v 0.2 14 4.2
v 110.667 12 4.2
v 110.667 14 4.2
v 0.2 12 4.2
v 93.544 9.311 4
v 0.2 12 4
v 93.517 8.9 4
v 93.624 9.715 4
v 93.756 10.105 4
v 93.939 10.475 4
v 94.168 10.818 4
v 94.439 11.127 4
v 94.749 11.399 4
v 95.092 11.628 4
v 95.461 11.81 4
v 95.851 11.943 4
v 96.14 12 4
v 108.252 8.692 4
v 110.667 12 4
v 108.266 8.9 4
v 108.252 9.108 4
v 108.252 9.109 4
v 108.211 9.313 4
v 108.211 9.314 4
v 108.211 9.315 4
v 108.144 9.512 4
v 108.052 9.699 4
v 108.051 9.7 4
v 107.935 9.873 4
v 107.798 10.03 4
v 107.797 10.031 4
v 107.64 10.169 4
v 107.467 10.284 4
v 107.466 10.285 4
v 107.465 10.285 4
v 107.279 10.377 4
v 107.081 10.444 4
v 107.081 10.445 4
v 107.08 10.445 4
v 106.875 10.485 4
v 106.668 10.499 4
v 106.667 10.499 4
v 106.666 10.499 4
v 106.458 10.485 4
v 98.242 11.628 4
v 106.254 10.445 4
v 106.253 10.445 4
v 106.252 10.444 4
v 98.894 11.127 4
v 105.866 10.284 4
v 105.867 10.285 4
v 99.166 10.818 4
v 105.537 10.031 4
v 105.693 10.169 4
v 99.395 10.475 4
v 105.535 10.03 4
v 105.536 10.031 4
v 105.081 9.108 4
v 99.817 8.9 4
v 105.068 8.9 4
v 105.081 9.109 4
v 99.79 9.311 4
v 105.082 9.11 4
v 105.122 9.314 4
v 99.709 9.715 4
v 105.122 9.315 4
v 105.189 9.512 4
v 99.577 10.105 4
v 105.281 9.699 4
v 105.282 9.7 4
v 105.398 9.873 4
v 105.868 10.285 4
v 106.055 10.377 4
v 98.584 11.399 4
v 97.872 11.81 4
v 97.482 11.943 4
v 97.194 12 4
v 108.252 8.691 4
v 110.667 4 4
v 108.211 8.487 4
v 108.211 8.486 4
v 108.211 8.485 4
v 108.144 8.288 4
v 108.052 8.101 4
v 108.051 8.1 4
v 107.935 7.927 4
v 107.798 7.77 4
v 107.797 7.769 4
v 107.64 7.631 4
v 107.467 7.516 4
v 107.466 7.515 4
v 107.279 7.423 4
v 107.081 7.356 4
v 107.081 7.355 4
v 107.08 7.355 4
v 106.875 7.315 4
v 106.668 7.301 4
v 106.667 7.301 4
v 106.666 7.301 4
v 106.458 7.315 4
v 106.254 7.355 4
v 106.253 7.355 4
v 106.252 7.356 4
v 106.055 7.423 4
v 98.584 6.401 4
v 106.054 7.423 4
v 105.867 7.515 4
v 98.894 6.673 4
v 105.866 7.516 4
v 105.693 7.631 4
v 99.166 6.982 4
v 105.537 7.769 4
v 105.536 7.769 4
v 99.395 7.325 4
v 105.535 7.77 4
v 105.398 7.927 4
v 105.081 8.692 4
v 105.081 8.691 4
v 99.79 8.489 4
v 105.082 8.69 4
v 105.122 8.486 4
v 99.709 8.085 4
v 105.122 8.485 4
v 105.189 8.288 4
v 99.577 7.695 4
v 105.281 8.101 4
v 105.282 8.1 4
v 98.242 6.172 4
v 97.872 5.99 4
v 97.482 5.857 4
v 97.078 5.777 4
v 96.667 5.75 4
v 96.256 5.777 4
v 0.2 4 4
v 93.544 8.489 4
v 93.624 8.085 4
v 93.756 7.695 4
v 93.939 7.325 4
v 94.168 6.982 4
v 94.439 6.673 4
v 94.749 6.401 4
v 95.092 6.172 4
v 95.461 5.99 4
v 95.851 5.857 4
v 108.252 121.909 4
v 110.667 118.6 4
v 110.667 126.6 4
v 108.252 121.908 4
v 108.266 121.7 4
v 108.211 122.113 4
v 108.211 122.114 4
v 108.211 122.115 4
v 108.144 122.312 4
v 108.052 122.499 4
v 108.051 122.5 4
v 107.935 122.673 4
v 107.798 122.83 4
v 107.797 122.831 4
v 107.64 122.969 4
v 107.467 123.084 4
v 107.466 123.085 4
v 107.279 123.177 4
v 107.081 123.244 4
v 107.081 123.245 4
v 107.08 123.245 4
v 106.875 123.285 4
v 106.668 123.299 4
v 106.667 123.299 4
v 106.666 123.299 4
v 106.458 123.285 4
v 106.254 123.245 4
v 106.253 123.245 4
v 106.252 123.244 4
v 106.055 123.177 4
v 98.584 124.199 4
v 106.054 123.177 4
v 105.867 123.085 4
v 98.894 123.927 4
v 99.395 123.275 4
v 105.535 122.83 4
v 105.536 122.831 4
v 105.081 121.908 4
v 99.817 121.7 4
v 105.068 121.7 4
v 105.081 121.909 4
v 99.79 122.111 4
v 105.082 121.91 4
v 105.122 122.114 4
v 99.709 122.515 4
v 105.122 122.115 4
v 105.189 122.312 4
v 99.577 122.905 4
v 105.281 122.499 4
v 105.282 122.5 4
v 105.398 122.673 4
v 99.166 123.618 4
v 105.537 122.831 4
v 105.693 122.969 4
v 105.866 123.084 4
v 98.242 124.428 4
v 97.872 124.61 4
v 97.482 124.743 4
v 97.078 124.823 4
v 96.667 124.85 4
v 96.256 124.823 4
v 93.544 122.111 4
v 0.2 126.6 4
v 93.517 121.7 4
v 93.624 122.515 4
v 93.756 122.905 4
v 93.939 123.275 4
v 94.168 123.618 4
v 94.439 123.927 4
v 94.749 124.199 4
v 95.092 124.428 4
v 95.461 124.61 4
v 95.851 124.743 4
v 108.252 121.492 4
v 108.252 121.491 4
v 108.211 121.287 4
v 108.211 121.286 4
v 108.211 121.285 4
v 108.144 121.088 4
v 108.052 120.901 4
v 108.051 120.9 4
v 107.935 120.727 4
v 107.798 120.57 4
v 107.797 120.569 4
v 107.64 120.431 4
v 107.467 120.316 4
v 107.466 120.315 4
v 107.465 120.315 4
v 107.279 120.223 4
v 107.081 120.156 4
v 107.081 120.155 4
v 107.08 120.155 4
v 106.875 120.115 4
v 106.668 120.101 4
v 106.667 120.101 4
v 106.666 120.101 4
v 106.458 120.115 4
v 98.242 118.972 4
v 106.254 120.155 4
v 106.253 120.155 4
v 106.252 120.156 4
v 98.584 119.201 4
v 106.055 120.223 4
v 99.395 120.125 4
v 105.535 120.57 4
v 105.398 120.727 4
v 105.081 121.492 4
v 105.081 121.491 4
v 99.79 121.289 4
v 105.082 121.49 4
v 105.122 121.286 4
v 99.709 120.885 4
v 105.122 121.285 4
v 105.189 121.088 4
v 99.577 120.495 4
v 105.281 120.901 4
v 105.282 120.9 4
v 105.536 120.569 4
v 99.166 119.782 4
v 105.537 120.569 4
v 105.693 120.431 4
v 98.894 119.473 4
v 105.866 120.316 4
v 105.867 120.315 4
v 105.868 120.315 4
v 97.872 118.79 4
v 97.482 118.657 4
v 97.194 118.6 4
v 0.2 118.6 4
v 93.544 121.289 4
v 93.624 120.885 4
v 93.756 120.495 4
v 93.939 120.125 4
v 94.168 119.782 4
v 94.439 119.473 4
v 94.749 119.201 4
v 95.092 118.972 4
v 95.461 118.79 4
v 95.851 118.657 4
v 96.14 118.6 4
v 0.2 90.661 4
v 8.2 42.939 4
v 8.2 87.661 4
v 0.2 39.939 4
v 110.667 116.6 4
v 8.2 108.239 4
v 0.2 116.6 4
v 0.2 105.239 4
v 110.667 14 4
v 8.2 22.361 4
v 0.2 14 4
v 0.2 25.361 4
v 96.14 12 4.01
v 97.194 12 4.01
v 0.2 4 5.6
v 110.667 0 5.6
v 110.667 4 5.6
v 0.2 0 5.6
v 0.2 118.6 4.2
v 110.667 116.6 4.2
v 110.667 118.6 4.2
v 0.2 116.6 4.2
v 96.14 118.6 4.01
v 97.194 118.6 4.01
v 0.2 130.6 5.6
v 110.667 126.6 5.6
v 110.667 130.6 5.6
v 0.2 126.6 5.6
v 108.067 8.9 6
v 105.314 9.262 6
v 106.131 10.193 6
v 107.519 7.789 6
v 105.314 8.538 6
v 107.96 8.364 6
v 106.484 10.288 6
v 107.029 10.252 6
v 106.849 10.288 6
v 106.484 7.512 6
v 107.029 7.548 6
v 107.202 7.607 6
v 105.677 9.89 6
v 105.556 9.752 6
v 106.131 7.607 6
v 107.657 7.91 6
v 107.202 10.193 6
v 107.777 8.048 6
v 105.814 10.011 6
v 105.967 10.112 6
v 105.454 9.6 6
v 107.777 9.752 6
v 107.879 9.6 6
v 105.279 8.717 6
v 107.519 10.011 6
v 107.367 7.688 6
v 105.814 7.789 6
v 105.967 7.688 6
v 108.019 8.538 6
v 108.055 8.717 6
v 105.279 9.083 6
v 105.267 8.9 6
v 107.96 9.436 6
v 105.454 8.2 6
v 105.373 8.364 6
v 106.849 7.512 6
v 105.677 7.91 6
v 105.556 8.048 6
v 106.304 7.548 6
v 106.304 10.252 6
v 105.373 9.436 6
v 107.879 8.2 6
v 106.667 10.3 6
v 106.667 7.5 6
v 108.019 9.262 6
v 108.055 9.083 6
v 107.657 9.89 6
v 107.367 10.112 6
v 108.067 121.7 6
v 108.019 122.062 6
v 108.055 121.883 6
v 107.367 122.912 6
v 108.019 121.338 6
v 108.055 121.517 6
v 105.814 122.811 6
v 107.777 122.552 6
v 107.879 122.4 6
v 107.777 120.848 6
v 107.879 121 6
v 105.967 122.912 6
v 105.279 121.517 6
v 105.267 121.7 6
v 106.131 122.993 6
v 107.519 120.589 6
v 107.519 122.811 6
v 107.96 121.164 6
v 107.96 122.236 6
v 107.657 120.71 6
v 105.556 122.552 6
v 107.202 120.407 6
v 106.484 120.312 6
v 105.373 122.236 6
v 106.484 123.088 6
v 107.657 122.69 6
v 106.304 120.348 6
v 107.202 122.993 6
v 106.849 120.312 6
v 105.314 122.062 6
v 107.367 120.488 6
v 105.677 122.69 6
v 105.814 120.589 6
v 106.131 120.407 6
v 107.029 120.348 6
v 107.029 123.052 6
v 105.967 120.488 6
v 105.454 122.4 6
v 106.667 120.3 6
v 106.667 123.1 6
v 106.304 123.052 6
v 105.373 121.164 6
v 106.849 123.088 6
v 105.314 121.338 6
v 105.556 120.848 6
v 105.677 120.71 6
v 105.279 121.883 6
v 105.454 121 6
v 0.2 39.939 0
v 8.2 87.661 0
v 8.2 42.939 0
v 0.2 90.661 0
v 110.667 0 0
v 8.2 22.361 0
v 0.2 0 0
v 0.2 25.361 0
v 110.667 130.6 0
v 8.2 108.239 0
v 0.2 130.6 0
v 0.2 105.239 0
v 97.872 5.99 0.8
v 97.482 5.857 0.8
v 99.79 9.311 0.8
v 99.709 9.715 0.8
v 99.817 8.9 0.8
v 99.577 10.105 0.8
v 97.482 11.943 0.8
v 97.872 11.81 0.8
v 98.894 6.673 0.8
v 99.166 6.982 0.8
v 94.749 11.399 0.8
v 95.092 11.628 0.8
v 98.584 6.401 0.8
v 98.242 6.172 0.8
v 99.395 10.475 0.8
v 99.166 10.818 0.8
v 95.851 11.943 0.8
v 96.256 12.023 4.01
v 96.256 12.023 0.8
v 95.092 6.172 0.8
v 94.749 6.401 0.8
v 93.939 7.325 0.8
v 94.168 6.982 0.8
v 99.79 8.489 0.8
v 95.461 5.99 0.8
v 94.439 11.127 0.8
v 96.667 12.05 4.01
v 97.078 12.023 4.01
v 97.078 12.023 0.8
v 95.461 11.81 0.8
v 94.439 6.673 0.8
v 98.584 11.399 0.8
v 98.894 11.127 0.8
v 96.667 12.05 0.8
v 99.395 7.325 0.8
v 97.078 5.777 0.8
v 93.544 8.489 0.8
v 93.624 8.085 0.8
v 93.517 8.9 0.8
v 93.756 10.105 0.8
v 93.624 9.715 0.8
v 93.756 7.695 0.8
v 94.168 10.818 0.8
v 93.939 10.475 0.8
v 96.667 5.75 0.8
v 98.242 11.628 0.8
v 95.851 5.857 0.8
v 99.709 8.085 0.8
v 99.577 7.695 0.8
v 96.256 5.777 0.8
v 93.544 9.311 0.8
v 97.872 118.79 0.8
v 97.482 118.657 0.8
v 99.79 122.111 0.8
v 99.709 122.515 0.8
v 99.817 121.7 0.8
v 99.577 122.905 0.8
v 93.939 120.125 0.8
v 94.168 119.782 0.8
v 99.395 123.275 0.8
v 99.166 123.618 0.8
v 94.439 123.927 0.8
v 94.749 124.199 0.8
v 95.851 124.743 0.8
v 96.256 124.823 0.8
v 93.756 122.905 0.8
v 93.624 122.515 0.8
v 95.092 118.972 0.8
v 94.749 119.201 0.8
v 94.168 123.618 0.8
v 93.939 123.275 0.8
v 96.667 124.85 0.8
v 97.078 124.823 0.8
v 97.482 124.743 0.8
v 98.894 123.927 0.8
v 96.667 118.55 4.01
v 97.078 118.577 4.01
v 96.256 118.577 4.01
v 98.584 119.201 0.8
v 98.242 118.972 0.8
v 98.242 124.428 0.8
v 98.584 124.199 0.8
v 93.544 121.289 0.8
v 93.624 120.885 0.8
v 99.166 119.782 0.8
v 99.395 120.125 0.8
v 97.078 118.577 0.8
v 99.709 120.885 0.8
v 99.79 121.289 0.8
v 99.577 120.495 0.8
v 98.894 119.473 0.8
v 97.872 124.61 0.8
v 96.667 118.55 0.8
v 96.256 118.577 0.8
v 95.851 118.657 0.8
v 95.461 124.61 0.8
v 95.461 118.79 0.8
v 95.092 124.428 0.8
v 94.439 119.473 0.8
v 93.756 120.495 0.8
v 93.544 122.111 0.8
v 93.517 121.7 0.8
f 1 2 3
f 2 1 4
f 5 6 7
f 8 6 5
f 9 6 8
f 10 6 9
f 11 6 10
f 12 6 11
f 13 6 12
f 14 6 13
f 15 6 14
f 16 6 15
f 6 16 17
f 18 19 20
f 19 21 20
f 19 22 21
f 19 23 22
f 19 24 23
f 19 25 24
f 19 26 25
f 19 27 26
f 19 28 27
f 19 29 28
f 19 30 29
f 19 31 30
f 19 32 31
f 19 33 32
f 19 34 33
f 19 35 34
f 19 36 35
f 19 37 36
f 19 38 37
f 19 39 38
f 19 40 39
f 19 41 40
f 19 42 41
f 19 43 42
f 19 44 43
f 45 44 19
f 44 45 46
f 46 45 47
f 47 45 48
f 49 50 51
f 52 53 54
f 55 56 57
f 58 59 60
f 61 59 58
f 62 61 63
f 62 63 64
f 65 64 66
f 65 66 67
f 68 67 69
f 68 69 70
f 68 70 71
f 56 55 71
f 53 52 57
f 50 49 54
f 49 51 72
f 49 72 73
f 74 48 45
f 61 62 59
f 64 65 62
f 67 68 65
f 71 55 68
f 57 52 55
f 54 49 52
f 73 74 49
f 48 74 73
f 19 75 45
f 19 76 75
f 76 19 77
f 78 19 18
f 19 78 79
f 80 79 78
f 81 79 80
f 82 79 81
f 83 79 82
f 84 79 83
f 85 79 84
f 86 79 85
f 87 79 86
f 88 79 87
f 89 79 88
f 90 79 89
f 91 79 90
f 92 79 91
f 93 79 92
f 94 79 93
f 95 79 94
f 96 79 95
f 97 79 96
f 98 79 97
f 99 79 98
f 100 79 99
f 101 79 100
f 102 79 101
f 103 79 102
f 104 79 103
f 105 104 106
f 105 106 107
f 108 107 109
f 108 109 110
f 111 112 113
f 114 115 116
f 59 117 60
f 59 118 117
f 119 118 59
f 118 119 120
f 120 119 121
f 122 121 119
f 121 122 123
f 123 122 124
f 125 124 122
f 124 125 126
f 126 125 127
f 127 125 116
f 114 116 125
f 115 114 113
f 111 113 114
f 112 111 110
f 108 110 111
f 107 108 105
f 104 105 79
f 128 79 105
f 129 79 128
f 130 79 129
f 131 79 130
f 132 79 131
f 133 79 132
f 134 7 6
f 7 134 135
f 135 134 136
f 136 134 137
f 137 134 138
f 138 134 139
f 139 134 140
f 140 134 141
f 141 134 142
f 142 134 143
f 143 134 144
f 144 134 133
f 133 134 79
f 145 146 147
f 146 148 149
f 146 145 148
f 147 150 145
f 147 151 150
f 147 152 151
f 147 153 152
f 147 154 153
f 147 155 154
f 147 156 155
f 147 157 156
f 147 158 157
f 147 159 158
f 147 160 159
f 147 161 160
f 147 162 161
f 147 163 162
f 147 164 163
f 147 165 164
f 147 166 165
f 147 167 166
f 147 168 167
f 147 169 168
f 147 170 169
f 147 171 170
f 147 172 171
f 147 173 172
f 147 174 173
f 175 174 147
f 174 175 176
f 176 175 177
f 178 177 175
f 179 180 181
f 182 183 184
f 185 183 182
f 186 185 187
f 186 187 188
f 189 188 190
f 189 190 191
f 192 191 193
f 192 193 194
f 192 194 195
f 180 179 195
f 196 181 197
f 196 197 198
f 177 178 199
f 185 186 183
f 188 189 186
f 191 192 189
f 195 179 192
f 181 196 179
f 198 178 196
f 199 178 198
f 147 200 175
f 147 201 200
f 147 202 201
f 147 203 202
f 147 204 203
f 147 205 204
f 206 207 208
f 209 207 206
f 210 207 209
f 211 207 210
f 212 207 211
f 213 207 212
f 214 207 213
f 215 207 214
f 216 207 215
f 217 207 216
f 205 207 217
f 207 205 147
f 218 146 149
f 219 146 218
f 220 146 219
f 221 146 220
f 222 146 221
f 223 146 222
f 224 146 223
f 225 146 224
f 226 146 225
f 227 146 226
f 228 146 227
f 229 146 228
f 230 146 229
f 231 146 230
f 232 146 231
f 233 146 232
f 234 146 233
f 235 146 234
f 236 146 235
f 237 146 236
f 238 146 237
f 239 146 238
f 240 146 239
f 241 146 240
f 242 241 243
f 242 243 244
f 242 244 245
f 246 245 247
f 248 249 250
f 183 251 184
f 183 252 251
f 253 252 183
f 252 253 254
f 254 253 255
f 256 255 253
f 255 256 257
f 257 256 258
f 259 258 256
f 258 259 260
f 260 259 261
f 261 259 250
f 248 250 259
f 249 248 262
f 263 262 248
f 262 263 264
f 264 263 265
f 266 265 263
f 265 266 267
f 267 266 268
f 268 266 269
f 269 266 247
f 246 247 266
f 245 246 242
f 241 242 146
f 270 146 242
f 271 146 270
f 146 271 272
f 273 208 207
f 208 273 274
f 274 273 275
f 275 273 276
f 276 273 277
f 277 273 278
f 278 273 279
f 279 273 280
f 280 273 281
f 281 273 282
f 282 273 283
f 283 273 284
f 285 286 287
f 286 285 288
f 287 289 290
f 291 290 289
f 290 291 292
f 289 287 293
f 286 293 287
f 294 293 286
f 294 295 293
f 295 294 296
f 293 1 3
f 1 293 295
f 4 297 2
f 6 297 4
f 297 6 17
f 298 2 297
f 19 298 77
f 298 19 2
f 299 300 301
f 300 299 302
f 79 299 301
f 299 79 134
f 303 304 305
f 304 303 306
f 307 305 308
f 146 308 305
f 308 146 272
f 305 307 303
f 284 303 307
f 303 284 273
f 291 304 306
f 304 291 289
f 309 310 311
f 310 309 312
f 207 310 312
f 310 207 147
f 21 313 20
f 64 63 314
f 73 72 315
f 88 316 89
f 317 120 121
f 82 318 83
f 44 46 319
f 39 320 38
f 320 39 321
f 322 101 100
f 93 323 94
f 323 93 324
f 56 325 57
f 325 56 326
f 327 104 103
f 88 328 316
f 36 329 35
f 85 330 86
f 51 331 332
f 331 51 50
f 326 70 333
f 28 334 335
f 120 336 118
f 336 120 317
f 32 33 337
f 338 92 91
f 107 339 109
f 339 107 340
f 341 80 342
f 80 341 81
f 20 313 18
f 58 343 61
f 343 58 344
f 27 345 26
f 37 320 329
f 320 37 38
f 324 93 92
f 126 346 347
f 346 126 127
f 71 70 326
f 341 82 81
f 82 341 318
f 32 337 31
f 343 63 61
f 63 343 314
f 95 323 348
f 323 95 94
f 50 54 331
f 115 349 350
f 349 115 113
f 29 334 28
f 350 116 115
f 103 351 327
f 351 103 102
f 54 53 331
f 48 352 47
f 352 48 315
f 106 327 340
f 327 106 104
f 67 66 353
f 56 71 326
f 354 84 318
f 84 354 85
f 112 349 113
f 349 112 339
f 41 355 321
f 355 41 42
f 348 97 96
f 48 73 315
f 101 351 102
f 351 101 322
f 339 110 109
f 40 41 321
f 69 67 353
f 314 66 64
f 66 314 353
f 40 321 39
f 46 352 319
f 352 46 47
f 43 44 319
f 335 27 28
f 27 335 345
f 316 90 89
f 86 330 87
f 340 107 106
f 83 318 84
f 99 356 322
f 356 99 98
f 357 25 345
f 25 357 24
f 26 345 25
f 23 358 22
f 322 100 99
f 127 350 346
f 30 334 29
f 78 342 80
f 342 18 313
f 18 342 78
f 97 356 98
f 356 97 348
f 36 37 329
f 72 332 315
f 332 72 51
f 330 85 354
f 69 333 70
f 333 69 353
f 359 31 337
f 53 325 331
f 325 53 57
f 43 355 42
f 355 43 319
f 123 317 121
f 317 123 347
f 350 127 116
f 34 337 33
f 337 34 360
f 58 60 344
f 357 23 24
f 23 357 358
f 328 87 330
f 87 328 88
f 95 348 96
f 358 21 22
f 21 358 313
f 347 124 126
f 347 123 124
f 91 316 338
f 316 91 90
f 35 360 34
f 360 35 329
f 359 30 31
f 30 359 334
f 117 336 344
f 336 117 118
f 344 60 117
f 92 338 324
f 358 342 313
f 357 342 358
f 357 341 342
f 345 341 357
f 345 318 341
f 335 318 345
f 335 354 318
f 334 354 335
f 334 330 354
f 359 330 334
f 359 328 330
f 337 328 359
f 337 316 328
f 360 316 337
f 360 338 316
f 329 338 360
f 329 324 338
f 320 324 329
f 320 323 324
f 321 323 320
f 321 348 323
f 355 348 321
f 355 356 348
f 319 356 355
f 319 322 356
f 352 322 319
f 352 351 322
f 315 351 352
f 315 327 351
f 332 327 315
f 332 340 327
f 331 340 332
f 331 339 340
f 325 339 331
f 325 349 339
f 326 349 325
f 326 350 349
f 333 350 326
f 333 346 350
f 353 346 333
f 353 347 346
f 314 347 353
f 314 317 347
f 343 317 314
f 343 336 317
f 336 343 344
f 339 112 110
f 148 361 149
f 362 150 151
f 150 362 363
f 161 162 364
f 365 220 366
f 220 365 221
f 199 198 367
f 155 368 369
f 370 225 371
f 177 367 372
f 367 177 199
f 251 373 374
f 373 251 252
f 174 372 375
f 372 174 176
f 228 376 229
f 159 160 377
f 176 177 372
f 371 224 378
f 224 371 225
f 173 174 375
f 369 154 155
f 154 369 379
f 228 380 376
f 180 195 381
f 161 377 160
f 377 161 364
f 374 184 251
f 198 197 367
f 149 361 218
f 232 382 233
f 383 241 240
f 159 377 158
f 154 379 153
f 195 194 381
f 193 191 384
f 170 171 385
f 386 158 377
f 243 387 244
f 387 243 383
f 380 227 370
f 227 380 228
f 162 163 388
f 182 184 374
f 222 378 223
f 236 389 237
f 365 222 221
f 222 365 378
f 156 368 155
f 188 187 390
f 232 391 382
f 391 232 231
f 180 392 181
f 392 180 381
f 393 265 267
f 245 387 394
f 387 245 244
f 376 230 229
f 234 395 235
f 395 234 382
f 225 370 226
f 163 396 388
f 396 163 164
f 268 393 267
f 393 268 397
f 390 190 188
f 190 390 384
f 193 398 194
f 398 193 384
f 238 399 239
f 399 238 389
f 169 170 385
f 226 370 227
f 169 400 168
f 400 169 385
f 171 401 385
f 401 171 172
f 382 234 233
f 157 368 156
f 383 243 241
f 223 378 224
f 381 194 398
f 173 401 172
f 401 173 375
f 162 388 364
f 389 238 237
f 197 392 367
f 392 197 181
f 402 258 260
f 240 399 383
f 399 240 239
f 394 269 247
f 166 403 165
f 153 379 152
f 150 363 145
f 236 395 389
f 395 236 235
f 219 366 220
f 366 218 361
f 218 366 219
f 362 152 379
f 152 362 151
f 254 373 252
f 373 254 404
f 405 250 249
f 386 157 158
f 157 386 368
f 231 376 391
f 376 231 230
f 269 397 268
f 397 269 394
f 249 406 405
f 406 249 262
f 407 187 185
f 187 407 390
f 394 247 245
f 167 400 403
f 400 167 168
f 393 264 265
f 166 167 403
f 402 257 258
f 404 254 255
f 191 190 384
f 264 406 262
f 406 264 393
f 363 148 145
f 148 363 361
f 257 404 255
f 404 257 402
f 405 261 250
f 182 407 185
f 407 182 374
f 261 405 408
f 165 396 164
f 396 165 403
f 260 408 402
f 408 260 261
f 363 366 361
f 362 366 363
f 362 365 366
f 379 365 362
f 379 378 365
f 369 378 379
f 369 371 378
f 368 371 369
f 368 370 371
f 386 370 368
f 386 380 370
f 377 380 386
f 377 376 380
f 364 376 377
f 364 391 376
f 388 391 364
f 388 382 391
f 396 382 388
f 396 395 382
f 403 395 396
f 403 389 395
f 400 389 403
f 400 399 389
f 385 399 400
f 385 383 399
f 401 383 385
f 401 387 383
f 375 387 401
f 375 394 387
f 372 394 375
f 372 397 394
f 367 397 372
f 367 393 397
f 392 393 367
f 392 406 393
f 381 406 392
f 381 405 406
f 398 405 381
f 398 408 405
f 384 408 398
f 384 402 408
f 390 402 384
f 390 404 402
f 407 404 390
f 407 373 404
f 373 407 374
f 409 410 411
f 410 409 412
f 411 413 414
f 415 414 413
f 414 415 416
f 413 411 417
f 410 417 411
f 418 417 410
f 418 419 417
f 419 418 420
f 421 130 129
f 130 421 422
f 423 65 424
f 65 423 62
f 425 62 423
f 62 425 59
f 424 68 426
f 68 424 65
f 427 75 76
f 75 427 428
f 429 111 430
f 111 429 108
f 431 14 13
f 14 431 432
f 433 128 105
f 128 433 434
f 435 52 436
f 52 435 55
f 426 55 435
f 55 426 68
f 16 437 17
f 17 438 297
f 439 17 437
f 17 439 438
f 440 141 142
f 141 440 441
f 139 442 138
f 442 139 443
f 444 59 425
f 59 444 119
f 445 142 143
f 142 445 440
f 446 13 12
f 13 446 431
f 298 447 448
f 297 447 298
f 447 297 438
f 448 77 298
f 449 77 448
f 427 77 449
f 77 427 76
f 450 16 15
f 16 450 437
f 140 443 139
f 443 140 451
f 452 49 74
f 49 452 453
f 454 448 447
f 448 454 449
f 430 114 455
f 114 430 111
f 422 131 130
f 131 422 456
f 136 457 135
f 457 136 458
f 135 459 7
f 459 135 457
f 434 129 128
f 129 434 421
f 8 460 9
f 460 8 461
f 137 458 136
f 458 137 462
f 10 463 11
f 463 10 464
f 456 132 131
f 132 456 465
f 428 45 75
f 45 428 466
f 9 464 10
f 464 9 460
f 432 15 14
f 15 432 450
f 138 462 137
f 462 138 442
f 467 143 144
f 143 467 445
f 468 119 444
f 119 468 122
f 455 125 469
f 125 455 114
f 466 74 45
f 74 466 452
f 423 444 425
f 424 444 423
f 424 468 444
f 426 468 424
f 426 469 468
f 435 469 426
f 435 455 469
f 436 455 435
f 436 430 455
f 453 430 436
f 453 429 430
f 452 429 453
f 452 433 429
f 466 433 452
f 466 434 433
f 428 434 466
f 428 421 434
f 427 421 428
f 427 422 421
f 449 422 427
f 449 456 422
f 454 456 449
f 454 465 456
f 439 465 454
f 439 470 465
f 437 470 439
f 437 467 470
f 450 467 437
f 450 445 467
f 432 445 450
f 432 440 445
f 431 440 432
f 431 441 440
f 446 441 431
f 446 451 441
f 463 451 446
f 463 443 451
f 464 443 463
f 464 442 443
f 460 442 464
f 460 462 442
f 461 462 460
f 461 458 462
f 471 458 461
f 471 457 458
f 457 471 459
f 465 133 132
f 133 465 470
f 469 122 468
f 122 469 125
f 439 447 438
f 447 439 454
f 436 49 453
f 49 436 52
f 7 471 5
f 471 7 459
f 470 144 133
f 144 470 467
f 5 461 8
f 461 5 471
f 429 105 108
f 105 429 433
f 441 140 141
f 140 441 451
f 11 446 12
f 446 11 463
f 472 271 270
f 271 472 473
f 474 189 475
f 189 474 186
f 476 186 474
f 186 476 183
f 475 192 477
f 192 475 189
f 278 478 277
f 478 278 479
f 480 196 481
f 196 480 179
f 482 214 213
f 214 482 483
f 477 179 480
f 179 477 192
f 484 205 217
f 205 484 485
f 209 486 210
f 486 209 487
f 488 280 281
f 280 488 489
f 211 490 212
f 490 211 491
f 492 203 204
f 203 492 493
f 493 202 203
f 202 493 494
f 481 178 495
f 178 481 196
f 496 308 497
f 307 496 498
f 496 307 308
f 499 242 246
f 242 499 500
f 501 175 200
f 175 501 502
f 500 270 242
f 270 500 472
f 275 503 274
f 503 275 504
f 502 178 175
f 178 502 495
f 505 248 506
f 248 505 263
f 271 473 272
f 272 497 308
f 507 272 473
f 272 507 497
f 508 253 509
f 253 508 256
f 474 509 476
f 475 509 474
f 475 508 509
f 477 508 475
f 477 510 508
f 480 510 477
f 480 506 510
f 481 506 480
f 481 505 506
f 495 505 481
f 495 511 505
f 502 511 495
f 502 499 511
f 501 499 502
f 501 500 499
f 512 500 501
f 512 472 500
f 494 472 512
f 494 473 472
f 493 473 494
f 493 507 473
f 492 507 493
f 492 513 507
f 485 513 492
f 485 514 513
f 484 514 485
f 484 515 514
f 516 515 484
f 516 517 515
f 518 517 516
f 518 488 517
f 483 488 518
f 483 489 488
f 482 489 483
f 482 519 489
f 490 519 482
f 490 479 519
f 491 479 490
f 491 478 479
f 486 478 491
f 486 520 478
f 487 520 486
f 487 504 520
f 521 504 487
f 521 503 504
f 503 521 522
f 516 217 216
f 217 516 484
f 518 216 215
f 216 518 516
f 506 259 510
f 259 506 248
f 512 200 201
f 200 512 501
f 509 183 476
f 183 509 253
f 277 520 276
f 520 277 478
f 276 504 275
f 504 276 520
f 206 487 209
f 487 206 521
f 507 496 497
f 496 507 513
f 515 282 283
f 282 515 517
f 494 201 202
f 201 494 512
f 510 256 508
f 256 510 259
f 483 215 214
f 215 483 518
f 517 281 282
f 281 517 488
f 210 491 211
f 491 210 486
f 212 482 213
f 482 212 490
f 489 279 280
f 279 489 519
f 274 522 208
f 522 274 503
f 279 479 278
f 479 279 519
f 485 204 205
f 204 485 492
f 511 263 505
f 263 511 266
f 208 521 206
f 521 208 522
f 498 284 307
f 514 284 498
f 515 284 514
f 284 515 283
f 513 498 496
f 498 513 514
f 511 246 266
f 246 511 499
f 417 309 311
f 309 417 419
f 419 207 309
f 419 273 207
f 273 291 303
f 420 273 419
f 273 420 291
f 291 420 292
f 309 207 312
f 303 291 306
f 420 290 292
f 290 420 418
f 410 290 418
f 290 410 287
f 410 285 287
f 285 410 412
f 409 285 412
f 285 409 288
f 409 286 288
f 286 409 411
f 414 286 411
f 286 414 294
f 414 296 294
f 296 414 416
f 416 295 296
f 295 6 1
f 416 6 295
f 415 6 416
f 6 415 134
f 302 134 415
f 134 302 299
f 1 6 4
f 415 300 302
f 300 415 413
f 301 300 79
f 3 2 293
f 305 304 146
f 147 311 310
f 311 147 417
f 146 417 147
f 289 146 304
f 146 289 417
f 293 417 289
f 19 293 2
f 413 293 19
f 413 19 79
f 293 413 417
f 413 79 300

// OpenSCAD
// file: ../parameters.scad
// Millimetres. Rebuild every mating part after changing these settings.
paper_width = 102;
paper_thickness = 0.30; // Measure an unexposed offcut; not a Fuji specification.
paper_side_clearance = 0.30;
guide_height = 0.20; // Below the emulsion plane: no lip over the long edges.
deck_thickness = 4;
end_allowance = 20;
side_shelf = 14;
outer_rail_width = 4;
outer_rail_height = 1.6;
mask_thickness = 4.8;
mask_edge_land = 0.8;
mask_bevel = 3.2;
mask_side_clearance = 0.4;
magnet_diameter = 6;
magnet_thickness = 3;
magnet_diameter_clearance = 0.3; // Diametral; glue fit, not a press fit.
magnet_depth_clearance = 0.2;
locator_diameter = 3.2;
locator_height = 2;
locator_clearance = 0.5; // Diametral.
band_width = 30; // Four fixed bands along the roll; the fifth takes the remainder.
minimum_last_band = 8;
cover_thickness = 2.8;
cover_lap = 0.8;
cover_lap_height = 1;
cover_clearance = 0.2; // Clearance inside the overlapping seam.
joint_clearance = 0.2;
joint_depth = 8;
build_size = [180, 180, 180];
bed_margin = 3;
$fn = 48;
eps = 0.01;

image_169 = paper_width * 16 / 9;
image_43 = paper_width * 4 / 3;
base_length = image_169 + 2 * end_allowance;
channel_width = paper_width + 2 * paper_side_clearance;
base_width = channel_width + 2 * side_shelf;
rail_inner = base_width / 2 - outer_rail_width;
mask_width = 2 * (rail_inner - mask_side_clearance);
paper_z = deck_thickness + paper_thickness;
mask_top = paper_z + mask_thickness;
magnet_x = base_length / 2 - 14;
locator_x = base_length / 2 - 4;
attachment_y = channel_width / 2 + 5.1;
cover_end = base_width / 2 + 8; // Y: both ends overhang the rails for handling.
cover_bottom = deck_thickness + outer_rail_height;
cover_lap_gap = cover_clearance;

function image_length(format) = format == "16:9" ? image_169 : image_43;
function cover_start(i, format="16:9") = -image_length(format) / 2 + i * band_width;
function band_center(i, format="16:9") = cover_start(i, format) + band_width / 2;
function final_band(format) = image_length(format) - 4 * band_width;

module check_parameters() {
    assert(paper_width >= 80 && paper_width <= 105, "Supported paper width: 80 to 105 mm.");
    assert(paper_thickness >= 0.25 && paper_thickness <= 0.6, "Measure paper thickness (0.25 to 0.6 mm).");
    assert(guide_height > 0 && guide_height <= paper_thickness - 0.05,
        "Channel guides must remain below the emulsion surface.");
    assert(paper_side_clearance >= 0.15 && paper_side_clearance <= 0.6);
    assert(deck_thickness >= magnet_thickness + magnet_depth_clearance + 0.8);
    assert(mask_thickness >= magnet_thickness + magnet_depth_clearance + 1.4);
    assert(end_allowance >= 20 && end_allowance <= 23);
    assert(mask_edge_land >= 0.8 && mask_bevel <= mask_thickness - mask_edge_land);
    assert(mask_side_clearance >= 0.25 && mask_side_clearance <= 0.6);
    assert(magnet_diameter == 6 && magnet_thickness == 3, "Attachment layout is for 6 x 3 mm magnets.");
    assert(magnet_diameter_clearance >= 0.1 && magnet_diameter_clearance <= 0.5);
    assert(magnet_depth_clearance >= 0.1 && magnet_depth_clearance <= 0.3);
    assert(mask_width / 2 - attachment_y - (magnet_diameter + magnet_diameter_clearance) / 2 >= 1.2);
    assert(locator_height + 0.3 < mask_thickness && locator_clearance >= 0.3);
    assert(cover_thickness >= 2.8 && cover_thickness <= 4);
    assert(cover_bottom - paper_z >= 0.6, "Covers must stay clear of the emulsion.");
    assert(cover_bottom + cover_thickness < mask_top, "Mask wings must stand above the covers as end stops.");
    assert(band_width >= 24 && final_band("4:3") >= minimum_last_band,
        "Four covers must leave a usable fifth band in the shorter 4:3 opening.");
    assert(minimum_last_band >= 8);
    assert(cover_lap >= 0.6 && cover_lap <= 1);
    assert(cover_lap_height >= 0.8 && cover_lap_height + cover_lap_gap < cover_thickness);
    assert(cover_clearance >= 0.15 && cover_clearance <= 0.3);
    assert(joint_clearance >= 0.15 && joint_clearance <= 0.35);
    assert(base_length / 2 + joint_depth <= build_size[0] - 2 * bed_margin);
    assert(base_width <= build_size[1] - 2 * bed_margin);
    assert(band_width + cover_lap <= build_size[0] - 2 * bed_margin);
    assert(2 * cover_end <= build_size[1] - 2 * bed_margin, "Transverse cover exceeds bed.");
    children();
}
// file: ../parts.scad
include <parameters.scad>

// Coordinates: X follows the roll; Y spans its width; Z=0 is the baseboard.
module box_at(x, y, z, dx, dy, dz) { translate([x, y, z]) cube([dx, dy, dz]); }

module dovetail_2d() {
    for (y = [-base_width / 4, base_width / 4])
        translate([0, y]) polygon([[-1, -7], [0, -7], [joint_depth, -10],
                                  [joint_depth, 10], [0, 7], [-1, 7]]);
}

module half_outline(left=true) {
    if (left) union() {
        translate([-base_length / 2, -base_width / 2]) square([base_length / 2, base_width]);
        dovetail_2d();
    } else difference() {
        translate([joint_clearance, -base_width / 2])
            square([base_length / 2 - joint_clearance, base_width]);
        offset(delta=joint_clearance) dovetail_2d();
    }
}

module full_deck() {
    difference() {
        union() {
            box_at(-base_length / 2, -base_width / 2, 0, base_length, base_width, deck_thickness);
            for (s = [-1, 1]) {
                // One-layer shallow guide beside (never over) the paper.
                box_at(-base_length / 2, s > 0 ? channel_width / 2 : -channel_width / 2 - 2,
                    deck_thickness, base_length, 2, guide_height);
                box_at(-base_length / 2, s > 0 ? rail_inner : -base_width / 2,
                    deck_thickness, base_length, outer_rail_width, outer_rail_height);
            }
            for (s = [-1, 1], t = [-1, 1])
                translate([s * locator_x, t * attachment_y, deck_thickness - eps])
                    cylinder(h=locator_height + eps, d1=locator_diameter, d2=locator_diameter - 0.4);
        }
        for (s = [-1, 1], t = [-1, 1])
            translate([s * magnet_x, t * attachment_y,
                       deck_thickness - magnet_thickness - magnet_depth_clearance])
                cylinder(h=magnet_thickness + magnet_depth_clearance + eps,
                         d=magnet_diameter + magnet_diameter_clearance);
    }
}

module base_half(left=true) {
    intersection() {
        full_deck();
        translate([0, 0, -eps]) linear_extrude(deck_thickness + locator_height + 2 * eps)
            half_outline(left);
    }
}

module base() { base_half(true); base_half(false); }

module end_mask(format="16:9", side=1) {
    assert(format == "16:9" || format == "4:3", "Unknown mask format.");
    // The outside wings retain vertical end-stop faces for the transverse covers.
    rotate([0, 0, side < 0 ? 180 : 0]) difference() {
        box_at(image_length(format) / 2, -mask_width / 2, paper_z,
            (base_length - image_length(format)) / 2, mask_width, mask_thickness);
        // Bevel only over the paper: the wings outside it are square stops.
        translate([image_length(format) / 2, channel_width / 2, paper_z])
            rotate([90, 0, 0]) linear_extrude(channel_width)
                polygon([[-eps, mask_edge_land], [mask_bevel, mask_thickness + eps],
                         [-eps, mask_thickness + eps]]);
        for (t = [-1, 1]) {
            translate([magnet_x, t * attachment_y, paper_z - eps])
                cylinder(h=magnet_thickness + magnet_depth_clearance + eps,
                         d=magnet_diameter + magnet_diameter_clearance);
            translate([locator_x, t * attachment_y, paper_z - eps])
                cylinder(h=locator_height + 0.3 + eps, d=locator_diameter + locator_clearance);
        }
        translate([base_length / 2 - 10, 0, mask_top - 0.4])
            linear_extrude(0.4 + eps) rotate([0, 0, 90])
                text(str(format, side < 0 ? " L" : " R"), size=3,
                    halign="center", valign="center", font="Liberation Sans:style=Bold");
    }
}

module masks(format="16:9") { for (s = [-1, 1]) end_mask(format, s); }

module cover(i=0, format="16:9") {
    assert(i >= 0 && i <= 3 && i == floor(i), "Cover index must be 0 to 3.");
    lo = cover_start(i, format);
    hi = lo + band_width;
    center = band_center(i, format);
    difference() {
        union() {
            box_at(lo, -cover_end, cover_bottom, band_width, 2 * cover_end, cover_thickness);
            if (i < 3) // No tongue into the fifth, always-exposed band.
                box_at(hi - eps, -cover_end, cover_bottom, cover_lap + eps,
                    2 * cover_end, cover_lap_height);
            // Lift grip is outside the paper and outside the side rail.
            hull() {
                box_at(center - 7, cover_end - 5, cover_bottom + cover_thickness - eps,
                    14, 4, eps);
                box_at(center - 6.5, cover_end - 4.5, cover_bottom + cover_thickness + 4 - eps,
                    13, 3, eps);
            }
        }
        if (i > 0)
            // A 45-degree underside replaces a floating horizontal cantilever.
            translate([lo, cover_end + eps, cover_bottom]) rotate([90, 0, 0])
                linear_extrude(2 * cover_end + 2 * eps)
                    polygon([[-eps, -eps], [cover_lap + cover_lap_gap, -eps],
                        [cover_lap + cover_lap_gap, cover_lap_height + cover_lap_gap],
                        [-eps, cover_lap_height + cover_lap + 2 * cover_lap_gap + eps]]);
        // Numeral at one end and tactile count on the other; no through-holes.
        translate([center, -cover_end + 3.5, cover_bottom + cover_thickness - 0.4])
            linear_extrude(0.4 + eps)
                text(str(i + 1), size=4, halign="center", valign="center", font="Liberation Sans:style=Bold");
        for (n = [0:i])
            translate([center + (n - i / 2) * 3, cover_end - 3,
                       cover_bottom + cover_thickness + 4 - 0.6]) cylinder(h=0.6 + eps, d=1.6);
    }
}

module covers(count=4, format="16:9") { if (count > 0) for (i = [0:count-1]) cover(i, format); }

module paper(length=base_length + 20) {
    box_at(-length / 2, -paper_width / 2, deck_thickness, length, paper_width, paper_thickness);
}

module base_plate(left=true) {
    translate([left ? base_length / 2 : 0, base_width / 2, 0]) base_half(left);
}

module mask_plate(format="16:9") {
    depth = (base_length - image_length(format)) / 2;
    for (s = [-1, 1])
        translate([s < 0 ? base_length / 2 : depth + 6 - image_length(format) / 2,
                   mask_width / 2, -paper_z]) end_mask(format, s);
}

module cover_plate(i=0) {
    translate([-cover_start(i), cover_end, -cover_bottom]) cover(i);
}

module fit_crop() {
    box_at(-base_length / 2, paper_width / 2 - 6, -eps,
        42, cover_end - paper_width / 2 + 6, 30);
}

module fit_plate() {
    translate([base_length / 2, -paper_width / 2 + 6, 0]) intersection() { base(); fit_crop(); }
    translate([52 + base_length / 2, -paper_width / 2 + 6, -paper_z])
        intersection() { end_mask("16:9", -1); fit_crop(); }
    translate([82 + image_169 / 2, -paper_width / 2 + 6, -cover_bottom])
        intersection() { cover(0); fit_crop(); }
}

module assembly(format="16:9", cover_count=0, exploded=0) {
    color("#454e55") base();
    color("#fff3d6") paper();
    translate([0, 0, exploded]) color("#327a94") masks(format);
    translate([0, 0, 2 * exploded])
        for (i = [0:cover_count-1]) if (cover_count > 0)
            color([0.9 - 0.1 * i, 0.56 - 0.08 * i, 0.19]) cover(i, format);
}
// main file
include <../parts.scad>
check_parameters() base_plate(false);
